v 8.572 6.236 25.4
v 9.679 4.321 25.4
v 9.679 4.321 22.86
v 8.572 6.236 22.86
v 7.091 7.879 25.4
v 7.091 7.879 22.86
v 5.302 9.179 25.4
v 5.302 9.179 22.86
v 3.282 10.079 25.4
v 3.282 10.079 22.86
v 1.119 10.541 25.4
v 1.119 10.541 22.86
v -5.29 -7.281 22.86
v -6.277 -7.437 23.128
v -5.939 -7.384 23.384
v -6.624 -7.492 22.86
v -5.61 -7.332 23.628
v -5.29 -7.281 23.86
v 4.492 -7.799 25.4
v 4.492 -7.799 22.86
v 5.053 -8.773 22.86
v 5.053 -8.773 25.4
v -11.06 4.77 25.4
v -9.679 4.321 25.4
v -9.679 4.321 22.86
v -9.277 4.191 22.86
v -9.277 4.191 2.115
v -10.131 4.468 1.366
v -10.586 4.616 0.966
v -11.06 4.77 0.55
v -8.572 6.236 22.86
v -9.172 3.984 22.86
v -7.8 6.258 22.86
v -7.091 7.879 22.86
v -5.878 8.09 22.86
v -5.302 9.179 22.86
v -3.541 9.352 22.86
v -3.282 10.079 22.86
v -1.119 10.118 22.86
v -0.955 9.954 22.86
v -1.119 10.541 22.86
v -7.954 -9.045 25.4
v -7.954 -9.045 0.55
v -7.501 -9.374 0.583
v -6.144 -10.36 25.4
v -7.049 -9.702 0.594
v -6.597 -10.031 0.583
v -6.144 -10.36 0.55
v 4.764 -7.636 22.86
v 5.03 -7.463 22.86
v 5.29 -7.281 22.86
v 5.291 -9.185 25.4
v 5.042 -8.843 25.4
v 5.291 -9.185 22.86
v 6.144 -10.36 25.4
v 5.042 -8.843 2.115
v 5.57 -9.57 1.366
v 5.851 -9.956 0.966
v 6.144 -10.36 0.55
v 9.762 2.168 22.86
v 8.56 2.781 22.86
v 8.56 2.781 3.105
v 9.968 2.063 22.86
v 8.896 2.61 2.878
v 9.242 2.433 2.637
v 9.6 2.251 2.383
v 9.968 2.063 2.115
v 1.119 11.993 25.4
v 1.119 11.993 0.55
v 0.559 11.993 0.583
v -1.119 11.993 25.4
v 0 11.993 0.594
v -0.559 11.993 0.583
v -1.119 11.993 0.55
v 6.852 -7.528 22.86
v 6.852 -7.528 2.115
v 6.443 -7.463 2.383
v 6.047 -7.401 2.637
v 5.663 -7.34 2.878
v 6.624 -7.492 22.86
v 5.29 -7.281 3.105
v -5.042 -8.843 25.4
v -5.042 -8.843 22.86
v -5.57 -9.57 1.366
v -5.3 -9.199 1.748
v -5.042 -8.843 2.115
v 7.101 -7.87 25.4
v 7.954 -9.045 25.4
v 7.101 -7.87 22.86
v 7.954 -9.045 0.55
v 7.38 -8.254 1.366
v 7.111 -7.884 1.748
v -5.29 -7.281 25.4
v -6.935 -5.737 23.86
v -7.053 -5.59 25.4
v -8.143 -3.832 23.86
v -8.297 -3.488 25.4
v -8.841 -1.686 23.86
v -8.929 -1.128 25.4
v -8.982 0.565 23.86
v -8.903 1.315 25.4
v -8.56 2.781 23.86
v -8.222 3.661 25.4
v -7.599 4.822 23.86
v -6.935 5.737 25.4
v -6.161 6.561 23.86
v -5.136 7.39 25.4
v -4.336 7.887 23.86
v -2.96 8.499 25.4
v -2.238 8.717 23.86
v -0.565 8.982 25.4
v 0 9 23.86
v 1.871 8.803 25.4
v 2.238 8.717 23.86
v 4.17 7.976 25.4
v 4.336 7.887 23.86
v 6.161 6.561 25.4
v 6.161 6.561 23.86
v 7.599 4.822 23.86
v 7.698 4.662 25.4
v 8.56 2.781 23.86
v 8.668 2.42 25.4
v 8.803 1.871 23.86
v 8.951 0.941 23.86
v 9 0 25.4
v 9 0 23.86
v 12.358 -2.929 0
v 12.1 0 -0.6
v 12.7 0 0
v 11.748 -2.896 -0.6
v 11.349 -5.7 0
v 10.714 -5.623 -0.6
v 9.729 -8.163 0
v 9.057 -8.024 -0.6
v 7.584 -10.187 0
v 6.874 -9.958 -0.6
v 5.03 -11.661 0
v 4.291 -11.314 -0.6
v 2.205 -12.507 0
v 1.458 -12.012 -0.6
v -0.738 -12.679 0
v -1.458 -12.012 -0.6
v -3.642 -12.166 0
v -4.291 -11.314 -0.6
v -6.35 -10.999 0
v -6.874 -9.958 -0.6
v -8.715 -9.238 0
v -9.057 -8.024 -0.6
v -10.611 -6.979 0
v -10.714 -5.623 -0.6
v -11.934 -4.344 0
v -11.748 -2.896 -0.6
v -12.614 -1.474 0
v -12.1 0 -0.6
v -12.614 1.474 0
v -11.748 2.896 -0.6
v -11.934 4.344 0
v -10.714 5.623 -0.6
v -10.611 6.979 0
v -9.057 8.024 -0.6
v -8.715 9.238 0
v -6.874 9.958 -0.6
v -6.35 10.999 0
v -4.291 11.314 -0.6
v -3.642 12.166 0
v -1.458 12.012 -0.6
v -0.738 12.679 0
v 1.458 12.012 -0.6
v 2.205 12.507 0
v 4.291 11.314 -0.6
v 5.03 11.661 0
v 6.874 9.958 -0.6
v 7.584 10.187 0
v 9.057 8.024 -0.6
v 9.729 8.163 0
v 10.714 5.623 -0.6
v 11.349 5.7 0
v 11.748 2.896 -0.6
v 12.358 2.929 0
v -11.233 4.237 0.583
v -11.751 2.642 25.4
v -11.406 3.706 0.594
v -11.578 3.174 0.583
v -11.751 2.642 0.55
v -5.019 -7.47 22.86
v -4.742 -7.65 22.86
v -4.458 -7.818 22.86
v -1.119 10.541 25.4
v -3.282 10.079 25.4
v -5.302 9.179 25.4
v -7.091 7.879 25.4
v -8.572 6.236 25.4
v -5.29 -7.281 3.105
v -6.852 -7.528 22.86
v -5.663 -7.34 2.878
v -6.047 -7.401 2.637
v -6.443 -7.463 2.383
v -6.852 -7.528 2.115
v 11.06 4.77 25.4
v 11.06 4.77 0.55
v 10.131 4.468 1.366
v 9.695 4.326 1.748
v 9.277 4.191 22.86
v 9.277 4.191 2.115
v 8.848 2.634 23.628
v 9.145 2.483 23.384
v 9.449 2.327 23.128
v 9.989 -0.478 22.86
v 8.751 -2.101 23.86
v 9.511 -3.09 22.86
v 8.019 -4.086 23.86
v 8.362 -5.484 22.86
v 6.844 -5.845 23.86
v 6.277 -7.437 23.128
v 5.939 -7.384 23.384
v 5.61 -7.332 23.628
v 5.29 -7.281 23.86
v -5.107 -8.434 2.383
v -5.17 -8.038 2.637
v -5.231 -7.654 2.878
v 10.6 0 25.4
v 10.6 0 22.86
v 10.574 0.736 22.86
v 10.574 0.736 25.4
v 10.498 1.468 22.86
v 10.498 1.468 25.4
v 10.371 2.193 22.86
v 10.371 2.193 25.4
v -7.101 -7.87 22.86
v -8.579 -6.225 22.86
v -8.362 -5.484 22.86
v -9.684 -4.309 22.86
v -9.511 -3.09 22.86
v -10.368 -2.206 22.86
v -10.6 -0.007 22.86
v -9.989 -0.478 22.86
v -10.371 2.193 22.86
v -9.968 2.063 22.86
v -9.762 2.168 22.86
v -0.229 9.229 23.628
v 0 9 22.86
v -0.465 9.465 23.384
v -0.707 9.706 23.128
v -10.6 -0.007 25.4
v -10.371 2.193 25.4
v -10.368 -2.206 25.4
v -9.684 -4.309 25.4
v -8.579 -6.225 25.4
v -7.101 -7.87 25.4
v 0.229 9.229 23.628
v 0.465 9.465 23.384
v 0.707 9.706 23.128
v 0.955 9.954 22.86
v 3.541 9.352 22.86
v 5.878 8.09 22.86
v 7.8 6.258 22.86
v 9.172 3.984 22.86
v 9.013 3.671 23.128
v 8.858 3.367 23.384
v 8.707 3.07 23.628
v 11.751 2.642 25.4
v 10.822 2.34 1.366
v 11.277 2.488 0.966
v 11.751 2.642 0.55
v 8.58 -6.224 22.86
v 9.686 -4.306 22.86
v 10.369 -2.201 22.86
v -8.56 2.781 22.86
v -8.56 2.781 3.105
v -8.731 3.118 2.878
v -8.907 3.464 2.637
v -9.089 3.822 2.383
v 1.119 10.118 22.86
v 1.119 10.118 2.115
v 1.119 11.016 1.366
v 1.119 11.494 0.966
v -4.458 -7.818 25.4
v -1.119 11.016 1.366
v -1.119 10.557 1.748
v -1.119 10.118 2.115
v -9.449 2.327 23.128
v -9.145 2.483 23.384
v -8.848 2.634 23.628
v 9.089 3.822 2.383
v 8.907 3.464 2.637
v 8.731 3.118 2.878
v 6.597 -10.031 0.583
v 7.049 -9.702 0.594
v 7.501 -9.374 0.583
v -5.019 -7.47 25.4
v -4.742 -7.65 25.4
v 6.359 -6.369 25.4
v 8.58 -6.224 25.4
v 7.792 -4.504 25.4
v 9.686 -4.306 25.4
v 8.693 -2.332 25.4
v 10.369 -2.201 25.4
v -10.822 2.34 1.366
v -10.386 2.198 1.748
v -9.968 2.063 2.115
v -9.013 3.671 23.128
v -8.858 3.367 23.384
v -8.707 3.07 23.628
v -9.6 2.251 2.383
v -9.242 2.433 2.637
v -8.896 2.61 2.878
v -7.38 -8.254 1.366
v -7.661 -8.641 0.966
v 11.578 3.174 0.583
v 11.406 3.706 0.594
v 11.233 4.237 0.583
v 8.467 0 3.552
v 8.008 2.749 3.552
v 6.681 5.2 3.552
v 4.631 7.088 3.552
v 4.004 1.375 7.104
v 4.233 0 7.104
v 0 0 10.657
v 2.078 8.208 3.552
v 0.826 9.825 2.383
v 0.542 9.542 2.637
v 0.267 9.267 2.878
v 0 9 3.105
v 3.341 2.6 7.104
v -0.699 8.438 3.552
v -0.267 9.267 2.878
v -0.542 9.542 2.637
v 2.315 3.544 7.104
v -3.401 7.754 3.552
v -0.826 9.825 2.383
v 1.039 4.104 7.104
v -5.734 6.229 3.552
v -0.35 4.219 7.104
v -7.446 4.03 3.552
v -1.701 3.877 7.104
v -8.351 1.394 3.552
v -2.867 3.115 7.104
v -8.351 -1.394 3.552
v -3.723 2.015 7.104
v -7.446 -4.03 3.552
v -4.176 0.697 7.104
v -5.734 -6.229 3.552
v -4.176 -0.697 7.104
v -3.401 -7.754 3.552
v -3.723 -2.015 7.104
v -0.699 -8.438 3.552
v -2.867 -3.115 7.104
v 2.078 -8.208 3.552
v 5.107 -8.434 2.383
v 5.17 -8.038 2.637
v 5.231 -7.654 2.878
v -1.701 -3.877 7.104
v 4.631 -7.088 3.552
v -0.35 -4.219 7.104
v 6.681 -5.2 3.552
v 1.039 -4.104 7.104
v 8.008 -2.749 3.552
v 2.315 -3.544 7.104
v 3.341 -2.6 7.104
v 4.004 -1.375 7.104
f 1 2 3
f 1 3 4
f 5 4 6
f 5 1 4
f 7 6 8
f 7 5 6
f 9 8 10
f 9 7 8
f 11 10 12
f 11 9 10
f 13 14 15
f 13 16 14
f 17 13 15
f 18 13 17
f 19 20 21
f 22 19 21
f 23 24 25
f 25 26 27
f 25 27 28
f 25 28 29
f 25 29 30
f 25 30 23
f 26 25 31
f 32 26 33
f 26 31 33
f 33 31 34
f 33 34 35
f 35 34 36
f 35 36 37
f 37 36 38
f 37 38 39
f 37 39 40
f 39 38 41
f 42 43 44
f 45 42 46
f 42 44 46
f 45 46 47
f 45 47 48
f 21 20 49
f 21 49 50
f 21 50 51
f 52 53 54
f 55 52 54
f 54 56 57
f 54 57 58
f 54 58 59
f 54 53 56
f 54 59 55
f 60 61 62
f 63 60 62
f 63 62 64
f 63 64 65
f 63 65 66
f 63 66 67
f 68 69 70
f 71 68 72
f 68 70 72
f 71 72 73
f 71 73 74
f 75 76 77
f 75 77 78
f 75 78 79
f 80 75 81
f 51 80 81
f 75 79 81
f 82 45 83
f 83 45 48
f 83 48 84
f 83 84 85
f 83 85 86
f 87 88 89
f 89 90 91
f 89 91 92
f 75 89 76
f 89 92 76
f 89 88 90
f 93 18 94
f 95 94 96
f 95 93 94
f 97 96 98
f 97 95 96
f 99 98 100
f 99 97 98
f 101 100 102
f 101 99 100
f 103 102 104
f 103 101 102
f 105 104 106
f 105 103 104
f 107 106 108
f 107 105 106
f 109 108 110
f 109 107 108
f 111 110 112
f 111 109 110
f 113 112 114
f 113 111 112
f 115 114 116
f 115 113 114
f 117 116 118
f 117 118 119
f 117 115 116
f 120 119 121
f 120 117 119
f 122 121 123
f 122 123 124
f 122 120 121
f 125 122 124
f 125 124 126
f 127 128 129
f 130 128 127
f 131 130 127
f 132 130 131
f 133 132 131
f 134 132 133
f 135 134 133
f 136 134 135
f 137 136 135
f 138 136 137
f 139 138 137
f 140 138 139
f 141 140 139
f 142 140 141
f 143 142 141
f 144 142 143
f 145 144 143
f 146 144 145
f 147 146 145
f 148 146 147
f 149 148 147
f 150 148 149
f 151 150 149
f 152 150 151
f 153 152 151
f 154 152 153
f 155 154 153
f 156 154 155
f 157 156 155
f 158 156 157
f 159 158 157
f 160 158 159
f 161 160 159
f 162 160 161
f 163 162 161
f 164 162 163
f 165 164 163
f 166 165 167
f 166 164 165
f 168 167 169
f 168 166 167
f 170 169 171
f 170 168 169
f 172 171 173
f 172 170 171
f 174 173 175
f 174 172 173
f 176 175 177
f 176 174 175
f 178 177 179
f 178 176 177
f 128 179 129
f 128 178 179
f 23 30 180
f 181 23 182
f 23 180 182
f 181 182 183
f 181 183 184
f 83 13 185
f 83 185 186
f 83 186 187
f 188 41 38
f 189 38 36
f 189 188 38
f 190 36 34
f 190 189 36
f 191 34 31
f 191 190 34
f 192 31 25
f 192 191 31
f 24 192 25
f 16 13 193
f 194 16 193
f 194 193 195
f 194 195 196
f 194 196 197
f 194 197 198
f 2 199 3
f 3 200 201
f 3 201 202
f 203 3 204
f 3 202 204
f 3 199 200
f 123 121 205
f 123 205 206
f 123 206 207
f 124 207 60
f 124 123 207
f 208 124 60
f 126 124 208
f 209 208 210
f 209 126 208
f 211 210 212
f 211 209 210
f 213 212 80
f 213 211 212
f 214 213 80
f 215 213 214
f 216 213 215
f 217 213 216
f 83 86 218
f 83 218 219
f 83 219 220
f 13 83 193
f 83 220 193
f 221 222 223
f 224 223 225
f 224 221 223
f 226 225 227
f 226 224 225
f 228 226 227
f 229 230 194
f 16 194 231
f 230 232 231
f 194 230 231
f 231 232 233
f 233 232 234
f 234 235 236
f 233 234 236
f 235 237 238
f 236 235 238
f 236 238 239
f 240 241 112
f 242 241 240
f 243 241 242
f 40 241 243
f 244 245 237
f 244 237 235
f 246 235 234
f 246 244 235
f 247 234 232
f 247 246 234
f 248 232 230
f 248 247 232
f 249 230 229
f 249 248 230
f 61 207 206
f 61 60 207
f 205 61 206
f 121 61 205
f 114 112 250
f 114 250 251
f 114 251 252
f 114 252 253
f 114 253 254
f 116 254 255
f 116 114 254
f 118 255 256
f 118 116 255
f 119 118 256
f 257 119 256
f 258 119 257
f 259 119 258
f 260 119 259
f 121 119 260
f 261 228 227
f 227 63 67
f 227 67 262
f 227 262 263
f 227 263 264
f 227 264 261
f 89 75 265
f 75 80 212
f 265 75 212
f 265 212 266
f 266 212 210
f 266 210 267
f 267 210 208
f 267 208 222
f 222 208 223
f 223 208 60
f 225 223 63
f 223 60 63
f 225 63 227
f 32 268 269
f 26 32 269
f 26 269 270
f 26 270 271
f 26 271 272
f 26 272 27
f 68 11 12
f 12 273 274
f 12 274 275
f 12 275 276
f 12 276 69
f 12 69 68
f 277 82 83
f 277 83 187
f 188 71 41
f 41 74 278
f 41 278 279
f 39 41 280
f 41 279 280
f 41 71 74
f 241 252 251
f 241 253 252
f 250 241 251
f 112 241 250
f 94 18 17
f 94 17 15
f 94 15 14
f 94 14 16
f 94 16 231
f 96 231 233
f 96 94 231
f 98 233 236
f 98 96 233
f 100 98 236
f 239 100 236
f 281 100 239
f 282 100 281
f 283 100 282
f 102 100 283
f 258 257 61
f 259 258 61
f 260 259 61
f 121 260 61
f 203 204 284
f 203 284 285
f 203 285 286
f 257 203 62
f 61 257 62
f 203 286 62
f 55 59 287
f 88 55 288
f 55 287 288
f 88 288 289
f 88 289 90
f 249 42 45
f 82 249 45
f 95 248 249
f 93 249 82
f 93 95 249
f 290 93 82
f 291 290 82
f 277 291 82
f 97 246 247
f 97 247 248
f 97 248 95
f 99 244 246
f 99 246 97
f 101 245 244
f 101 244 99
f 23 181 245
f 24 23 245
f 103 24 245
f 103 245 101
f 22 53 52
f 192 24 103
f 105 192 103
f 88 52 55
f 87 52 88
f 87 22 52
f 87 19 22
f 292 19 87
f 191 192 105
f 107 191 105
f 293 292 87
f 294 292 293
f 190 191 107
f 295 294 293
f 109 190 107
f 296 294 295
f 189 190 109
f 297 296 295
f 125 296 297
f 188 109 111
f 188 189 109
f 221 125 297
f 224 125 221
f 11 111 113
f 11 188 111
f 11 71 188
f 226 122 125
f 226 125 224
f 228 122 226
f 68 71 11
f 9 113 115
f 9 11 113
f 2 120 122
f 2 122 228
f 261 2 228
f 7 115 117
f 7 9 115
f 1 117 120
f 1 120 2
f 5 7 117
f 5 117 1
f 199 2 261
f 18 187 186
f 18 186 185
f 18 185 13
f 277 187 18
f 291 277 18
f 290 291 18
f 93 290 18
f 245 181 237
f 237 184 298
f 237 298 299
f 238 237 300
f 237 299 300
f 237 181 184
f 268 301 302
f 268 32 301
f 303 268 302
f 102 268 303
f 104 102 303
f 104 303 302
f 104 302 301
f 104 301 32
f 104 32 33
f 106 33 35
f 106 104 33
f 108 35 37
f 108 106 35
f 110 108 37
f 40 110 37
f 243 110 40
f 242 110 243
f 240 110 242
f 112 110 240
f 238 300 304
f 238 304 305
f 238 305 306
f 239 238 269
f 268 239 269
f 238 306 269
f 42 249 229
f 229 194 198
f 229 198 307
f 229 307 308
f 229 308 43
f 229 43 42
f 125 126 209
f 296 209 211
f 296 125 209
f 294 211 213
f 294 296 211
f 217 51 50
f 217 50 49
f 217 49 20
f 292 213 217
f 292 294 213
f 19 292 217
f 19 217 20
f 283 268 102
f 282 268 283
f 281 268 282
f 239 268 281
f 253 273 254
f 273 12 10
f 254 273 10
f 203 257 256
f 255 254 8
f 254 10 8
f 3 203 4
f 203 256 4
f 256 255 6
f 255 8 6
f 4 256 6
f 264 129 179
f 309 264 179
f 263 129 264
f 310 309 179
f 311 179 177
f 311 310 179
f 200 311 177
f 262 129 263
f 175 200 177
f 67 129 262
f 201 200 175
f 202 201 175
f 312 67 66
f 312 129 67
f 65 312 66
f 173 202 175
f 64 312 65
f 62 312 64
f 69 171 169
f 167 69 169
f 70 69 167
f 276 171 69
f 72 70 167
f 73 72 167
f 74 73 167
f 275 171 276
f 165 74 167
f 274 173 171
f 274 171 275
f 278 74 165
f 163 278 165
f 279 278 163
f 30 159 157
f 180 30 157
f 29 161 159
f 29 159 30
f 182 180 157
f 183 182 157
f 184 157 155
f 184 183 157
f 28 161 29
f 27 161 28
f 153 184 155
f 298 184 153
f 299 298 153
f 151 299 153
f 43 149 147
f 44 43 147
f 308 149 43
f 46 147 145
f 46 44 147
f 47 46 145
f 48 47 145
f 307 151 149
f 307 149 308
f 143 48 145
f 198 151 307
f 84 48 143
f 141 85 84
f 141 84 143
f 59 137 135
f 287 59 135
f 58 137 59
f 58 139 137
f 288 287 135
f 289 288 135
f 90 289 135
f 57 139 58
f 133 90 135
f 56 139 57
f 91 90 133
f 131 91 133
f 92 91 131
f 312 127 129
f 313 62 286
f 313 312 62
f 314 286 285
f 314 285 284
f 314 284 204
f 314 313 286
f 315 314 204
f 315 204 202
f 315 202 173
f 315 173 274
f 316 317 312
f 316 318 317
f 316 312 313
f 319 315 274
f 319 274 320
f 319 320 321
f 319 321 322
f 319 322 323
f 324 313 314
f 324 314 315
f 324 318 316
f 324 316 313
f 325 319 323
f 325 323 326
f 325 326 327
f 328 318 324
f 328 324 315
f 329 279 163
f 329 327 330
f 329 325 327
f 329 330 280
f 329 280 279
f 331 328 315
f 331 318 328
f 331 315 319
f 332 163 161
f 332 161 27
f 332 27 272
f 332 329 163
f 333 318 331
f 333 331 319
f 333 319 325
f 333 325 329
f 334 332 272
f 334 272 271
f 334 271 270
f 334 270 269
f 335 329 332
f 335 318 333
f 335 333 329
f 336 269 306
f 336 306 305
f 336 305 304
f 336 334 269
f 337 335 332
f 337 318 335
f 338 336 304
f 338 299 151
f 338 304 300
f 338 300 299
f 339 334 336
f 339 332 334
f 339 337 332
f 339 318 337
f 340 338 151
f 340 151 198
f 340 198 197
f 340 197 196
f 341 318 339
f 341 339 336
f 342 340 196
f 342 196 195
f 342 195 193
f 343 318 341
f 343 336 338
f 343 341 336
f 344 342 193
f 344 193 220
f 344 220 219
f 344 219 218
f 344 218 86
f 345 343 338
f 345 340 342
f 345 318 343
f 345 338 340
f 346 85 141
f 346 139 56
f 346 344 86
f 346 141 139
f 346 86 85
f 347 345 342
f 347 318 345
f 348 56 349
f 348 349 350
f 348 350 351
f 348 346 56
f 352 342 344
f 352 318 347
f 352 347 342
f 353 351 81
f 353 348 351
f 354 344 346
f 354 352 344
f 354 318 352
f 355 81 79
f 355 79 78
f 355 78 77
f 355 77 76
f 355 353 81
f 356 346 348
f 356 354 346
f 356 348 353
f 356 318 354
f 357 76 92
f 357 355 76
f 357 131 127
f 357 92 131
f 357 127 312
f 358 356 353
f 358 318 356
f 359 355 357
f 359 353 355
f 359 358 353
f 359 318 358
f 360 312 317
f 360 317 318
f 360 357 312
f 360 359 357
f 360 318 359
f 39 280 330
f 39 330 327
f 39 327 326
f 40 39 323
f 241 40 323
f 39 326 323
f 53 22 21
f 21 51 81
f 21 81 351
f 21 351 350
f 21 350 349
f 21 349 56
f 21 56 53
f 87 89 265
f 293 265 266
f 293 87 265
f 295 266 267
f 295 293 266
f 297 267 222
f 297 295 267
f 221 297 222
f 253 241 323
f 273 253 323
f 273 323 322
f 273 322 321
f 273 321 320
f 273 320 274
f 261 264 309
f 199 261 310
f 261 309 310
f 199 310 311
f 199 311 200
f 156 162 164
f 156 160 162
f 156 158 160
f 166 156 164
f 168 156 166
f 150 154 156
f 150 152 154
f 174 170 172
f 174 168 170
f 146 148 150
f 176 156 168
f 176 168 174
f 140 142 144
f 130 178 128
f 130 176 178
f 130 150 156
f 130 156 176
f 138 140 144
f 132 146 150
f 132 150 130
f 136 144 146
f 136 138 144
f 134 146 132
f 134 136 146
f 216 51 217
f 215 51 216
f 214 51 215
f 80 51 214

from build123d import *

# Parameters (mm, degrees)
F3_DEPTH     = 25.4
F5_DEPTH     = 2.54
F1_FACE_R    = 12.7
F6_DEPTH     = 0.6
F6_TAPER     = 45
F7_T4_ANGLE  = 71.9999997561
F7_T10_ANGLE = 72.000000061
F7_T16_ANGLE = 72.000000061
F7_T22_ANGLE = 72.000000061


# Not quite as in the source:
# - a fillet or chamfer that OpenCascade refuses, or shapes differently, is made with other operations: its cross-section is extruded or revolved along the edge and cut away or added


with BuildPart() as f1:
    # F0 (on Front) → F1 (revolve)
    with BuildSketch(Plane.XZ):
        Polygon((0, 10.656565316), (0, 0), (12.7, 0), align=None)
    revolve(axis=Axis((0, 0, 24.9413493462), (0, 0, 1)))

    # F2 (on Top) → F3 (join)
    with BuildSketch(Plane.XY):
        Polygon((-9.9684698397, 2.0625815326), (-8.5595086348, 2.7811529858), (-9.2770164791, 4.1906561266), (-11.0598678693, 4.7699396671), (-11.7513212299, 2.6418650731), align=None)
        Polygon((-1.1187950245, 10.1179509397), (0, 9), (1.1187950245, 10.1179509397), (1.1187950245, 11.9925518305), (-1.1187950245, 11.9925518305), align=None)
        Polygon((9.2770165014, 4.1906560772), (8.5595086496, 2.7811529403), (9.9684698507, 2.0625814795), (11.751321244, 2.6418650106), (11.0598678947, 4.7699396082), align=None)
        Polygon((6.8523065178, -7.5279830573), (5.2900672551, -7.2811529606), (5.0420581389, -8.8432054849), (6.1439208932, -10.3597894656), (7.9541692721, -9.044567038), align=None)
        Polygon((-5.0420581859, -8.8432054581), (-5.2900672939, -7.2811529325), (-6.8523065578, -7.5279830208), (-7.9541693202, -9.0445669956), (-6.1439209483, -10.3597894329), align=None)
    extrude(amount=F3_DEPTH)

    # F4 (on face) → F5 (join)
    with BuildSketch(Plane.XY.offset(25.4)):
        with BuildLine():
            ThreePointArc((-5.2900672939, -7.2811529325), (-4.0859144849, 8.0190587242), (9, 0))
            ThreePointArc((9, 0), (7.7919238303, -4.5039896783), (4.4920171062, -7.7988321124))
            Line((4.4920171062, -7.7988321124), (5.2905979251, -9.1852911546))
            ThreePointArc((5.2905979251, -9.1852911546), (9.1771547335, -5.3046989544), (10.6, 0))
            ThreePointArc((10.6, 0), (-4.306450321, 9.6857878168), (-7.1008463458, -7.8700686892))
            Line((-7.1008463458, -7.8700686892), (-6.8523065578, -7.5279830208))
            Line((-6.8523065578, -7.5279830208), (-5.2900672939, -7.2811529325))
        make_face()
        with BuildLine():
            ThreePointArc((-4.457782334, -7.8184510399), (-4.8813231204, -7.5612621033), (-5.2900672939, -7.2811529325))
            Line((-5.2900672939, -7.2811529325), (-5.0420581859, -8.8432054581))
            Line((-5.0420581859, -8.8432054581), (-4.457782334, -7.8184510399))
        make_face()
    extrude(amount=-F5_DEPTH)

    # F1_face (on face) → F6 (join)
    with BuildSketch(Plane(origin=(0, 0, 0), x_dir=(1, 0, 0), z_dir=(0, 0, -1))):
        Circle(F1_FACE_R)
    extrude(amount=F6_DEPTH, taper=F6_TAPER)

    # F7: chamfer of 1 on 4 edges, made by hand


with BuildPart() as f7_tool2:
    # F7_s3 → F7_t4 (revolve)
    with BuildSketch(Plane(origin=(0, 0, 0), x_dir=(0, 0, 1), z_dir=(-0.3090169984, -0.951056515, 0))):
        Polygon((22.86, 10), (23.86, 9), (22.86, 9), align=None)
    revolve(axis=Axis((0, 0, 22.86), (0, 0, -1)), revolution_arc=F7_T4_ANGLE)

    split(bisect_by=Plane(origin=(4.4999987183, 4.5033963456, 0), x_dir=(0, 0, 1), z_dir=(-0.7068398887, -0.707373573, 0)), keep=Keep.TOP)

    split(bisect_by=Plane(origin=(-5.6735605309, -2.888127077, 0), x_dir=(0, 0, 1), z_dir=(0.8911777859, 0.4536542229, 0)), keep=Keep.TOP)


with BuildPart() as f1_1:
    add(f1.part)

    # F7_t1: cut F7_tool2
    add(f7_tool2.part, mode=Mode.SUBTRACT)


with BuildPart() as f7_tool8:
    # F7_s9 → F7_t10 (revolve)
    with BuildSketch(Plane(origin=(0, 0, 0), x_dir=(0, 0, 1), z_dir=(0.8090169925, -0.5877852549, 0))):
        Polygon((22.86, 10), (23.86, 9), (22.86, 9), align=None)
    revolve(axis=Axis((0, 0, 22.86), (0, 0, -1)), revolution_arc=F7_T10_ANGLE)

    split(bisect_by=Plane(origin=(-2.8924083372, 5.6713791199, 0), x_dir=(0, 0, 1), z_dir=(0.4543267043, -0.8908351395, 0)), keep=Keep.TOP)

    split(bisect_by=Plane(origin=(0.9935454605, -6.2883570612, 0), x_dir=(0, 0, 1), z_dir=(-0.1560617251, 0.9877473047, 0)), keep=Keep.TOP)


with BuildPart() as f1_2:
    add(f1_1.part)

    # F7_t7: cut F7_tool8
    add(f7_tool8.part, mode=Mode.SUBTRACT)


with BuildPart() as f7_tool14:
    # F7_s15 → F7_t16 (revolve)
    with BuildSketch(Plane.YZ):
        Polygon((10, 22.86), (9, 23.86), (9, 22.86), align=None)
    revolve(axis=Axis((0, 0, 22.86), (0, 0, -1)), revolution_arc=F7_T16_ANGLE)

    split(bisect_by=Plane(origin=(5.6735605155, -2.8881271072, 0), x_dir=(0, 0, 1), z_dir=(-0.8911777835, 0.4536542277, 0)), keep=Keep.TOP)

    split(bisect_by=Plane(origin=(-4.4999987183, 4.5033963456, 0), x_dir=(0, 0, 1), z_dir=(0.7068398887, -0.707373573, 0)), keep=Keep.TOP)


with BuildPart() as f1_3:
    add(f1_2.part)

    # F7_t13: cut F7_tool14
    add(f7_tool14.part, mode=Mode.SUBTRACT)


with BuildPart() as f7_tool20:
    # F7_s21 → F7_t22 (revolve)
    with BuildSketch(Plane(origin=(0, 0, 0), x_dir=(0, 0, 1), z_dir=(-0.3090169934, 0.9510565166, 0))):
        Polygon((22.86, 10), (23.86, 9), (22.86, 9), align=None)
    revolve(axis=Axis((0, 0, 22.86), (0, 0, -1)), revolution_arc=F7_T22_ANGLE)

    split(bisect_by=Plane(origin=(2.8924083674, 5.6713791045, 0), x_dir=(0, 0, 1), z_dir=(-0.4543267091, -0.8908351371, 0)), keep=Keep.TOP)

    split(bisect_by=Plane(origin=(-0.993545494, -6.2883570559, 0), x_dir=(0, 0, 1), z_dir=(0.1560617303, 0.9877473039, 0)), keep=Keep.TOP)


with BuildPart() as f1_4:
    add(f1_3.part)

    # F7_t19: cut F7_tool20
    add(f7_tool20.part, mode=Mode.SUBTRACT)


solid = f1_4.part
